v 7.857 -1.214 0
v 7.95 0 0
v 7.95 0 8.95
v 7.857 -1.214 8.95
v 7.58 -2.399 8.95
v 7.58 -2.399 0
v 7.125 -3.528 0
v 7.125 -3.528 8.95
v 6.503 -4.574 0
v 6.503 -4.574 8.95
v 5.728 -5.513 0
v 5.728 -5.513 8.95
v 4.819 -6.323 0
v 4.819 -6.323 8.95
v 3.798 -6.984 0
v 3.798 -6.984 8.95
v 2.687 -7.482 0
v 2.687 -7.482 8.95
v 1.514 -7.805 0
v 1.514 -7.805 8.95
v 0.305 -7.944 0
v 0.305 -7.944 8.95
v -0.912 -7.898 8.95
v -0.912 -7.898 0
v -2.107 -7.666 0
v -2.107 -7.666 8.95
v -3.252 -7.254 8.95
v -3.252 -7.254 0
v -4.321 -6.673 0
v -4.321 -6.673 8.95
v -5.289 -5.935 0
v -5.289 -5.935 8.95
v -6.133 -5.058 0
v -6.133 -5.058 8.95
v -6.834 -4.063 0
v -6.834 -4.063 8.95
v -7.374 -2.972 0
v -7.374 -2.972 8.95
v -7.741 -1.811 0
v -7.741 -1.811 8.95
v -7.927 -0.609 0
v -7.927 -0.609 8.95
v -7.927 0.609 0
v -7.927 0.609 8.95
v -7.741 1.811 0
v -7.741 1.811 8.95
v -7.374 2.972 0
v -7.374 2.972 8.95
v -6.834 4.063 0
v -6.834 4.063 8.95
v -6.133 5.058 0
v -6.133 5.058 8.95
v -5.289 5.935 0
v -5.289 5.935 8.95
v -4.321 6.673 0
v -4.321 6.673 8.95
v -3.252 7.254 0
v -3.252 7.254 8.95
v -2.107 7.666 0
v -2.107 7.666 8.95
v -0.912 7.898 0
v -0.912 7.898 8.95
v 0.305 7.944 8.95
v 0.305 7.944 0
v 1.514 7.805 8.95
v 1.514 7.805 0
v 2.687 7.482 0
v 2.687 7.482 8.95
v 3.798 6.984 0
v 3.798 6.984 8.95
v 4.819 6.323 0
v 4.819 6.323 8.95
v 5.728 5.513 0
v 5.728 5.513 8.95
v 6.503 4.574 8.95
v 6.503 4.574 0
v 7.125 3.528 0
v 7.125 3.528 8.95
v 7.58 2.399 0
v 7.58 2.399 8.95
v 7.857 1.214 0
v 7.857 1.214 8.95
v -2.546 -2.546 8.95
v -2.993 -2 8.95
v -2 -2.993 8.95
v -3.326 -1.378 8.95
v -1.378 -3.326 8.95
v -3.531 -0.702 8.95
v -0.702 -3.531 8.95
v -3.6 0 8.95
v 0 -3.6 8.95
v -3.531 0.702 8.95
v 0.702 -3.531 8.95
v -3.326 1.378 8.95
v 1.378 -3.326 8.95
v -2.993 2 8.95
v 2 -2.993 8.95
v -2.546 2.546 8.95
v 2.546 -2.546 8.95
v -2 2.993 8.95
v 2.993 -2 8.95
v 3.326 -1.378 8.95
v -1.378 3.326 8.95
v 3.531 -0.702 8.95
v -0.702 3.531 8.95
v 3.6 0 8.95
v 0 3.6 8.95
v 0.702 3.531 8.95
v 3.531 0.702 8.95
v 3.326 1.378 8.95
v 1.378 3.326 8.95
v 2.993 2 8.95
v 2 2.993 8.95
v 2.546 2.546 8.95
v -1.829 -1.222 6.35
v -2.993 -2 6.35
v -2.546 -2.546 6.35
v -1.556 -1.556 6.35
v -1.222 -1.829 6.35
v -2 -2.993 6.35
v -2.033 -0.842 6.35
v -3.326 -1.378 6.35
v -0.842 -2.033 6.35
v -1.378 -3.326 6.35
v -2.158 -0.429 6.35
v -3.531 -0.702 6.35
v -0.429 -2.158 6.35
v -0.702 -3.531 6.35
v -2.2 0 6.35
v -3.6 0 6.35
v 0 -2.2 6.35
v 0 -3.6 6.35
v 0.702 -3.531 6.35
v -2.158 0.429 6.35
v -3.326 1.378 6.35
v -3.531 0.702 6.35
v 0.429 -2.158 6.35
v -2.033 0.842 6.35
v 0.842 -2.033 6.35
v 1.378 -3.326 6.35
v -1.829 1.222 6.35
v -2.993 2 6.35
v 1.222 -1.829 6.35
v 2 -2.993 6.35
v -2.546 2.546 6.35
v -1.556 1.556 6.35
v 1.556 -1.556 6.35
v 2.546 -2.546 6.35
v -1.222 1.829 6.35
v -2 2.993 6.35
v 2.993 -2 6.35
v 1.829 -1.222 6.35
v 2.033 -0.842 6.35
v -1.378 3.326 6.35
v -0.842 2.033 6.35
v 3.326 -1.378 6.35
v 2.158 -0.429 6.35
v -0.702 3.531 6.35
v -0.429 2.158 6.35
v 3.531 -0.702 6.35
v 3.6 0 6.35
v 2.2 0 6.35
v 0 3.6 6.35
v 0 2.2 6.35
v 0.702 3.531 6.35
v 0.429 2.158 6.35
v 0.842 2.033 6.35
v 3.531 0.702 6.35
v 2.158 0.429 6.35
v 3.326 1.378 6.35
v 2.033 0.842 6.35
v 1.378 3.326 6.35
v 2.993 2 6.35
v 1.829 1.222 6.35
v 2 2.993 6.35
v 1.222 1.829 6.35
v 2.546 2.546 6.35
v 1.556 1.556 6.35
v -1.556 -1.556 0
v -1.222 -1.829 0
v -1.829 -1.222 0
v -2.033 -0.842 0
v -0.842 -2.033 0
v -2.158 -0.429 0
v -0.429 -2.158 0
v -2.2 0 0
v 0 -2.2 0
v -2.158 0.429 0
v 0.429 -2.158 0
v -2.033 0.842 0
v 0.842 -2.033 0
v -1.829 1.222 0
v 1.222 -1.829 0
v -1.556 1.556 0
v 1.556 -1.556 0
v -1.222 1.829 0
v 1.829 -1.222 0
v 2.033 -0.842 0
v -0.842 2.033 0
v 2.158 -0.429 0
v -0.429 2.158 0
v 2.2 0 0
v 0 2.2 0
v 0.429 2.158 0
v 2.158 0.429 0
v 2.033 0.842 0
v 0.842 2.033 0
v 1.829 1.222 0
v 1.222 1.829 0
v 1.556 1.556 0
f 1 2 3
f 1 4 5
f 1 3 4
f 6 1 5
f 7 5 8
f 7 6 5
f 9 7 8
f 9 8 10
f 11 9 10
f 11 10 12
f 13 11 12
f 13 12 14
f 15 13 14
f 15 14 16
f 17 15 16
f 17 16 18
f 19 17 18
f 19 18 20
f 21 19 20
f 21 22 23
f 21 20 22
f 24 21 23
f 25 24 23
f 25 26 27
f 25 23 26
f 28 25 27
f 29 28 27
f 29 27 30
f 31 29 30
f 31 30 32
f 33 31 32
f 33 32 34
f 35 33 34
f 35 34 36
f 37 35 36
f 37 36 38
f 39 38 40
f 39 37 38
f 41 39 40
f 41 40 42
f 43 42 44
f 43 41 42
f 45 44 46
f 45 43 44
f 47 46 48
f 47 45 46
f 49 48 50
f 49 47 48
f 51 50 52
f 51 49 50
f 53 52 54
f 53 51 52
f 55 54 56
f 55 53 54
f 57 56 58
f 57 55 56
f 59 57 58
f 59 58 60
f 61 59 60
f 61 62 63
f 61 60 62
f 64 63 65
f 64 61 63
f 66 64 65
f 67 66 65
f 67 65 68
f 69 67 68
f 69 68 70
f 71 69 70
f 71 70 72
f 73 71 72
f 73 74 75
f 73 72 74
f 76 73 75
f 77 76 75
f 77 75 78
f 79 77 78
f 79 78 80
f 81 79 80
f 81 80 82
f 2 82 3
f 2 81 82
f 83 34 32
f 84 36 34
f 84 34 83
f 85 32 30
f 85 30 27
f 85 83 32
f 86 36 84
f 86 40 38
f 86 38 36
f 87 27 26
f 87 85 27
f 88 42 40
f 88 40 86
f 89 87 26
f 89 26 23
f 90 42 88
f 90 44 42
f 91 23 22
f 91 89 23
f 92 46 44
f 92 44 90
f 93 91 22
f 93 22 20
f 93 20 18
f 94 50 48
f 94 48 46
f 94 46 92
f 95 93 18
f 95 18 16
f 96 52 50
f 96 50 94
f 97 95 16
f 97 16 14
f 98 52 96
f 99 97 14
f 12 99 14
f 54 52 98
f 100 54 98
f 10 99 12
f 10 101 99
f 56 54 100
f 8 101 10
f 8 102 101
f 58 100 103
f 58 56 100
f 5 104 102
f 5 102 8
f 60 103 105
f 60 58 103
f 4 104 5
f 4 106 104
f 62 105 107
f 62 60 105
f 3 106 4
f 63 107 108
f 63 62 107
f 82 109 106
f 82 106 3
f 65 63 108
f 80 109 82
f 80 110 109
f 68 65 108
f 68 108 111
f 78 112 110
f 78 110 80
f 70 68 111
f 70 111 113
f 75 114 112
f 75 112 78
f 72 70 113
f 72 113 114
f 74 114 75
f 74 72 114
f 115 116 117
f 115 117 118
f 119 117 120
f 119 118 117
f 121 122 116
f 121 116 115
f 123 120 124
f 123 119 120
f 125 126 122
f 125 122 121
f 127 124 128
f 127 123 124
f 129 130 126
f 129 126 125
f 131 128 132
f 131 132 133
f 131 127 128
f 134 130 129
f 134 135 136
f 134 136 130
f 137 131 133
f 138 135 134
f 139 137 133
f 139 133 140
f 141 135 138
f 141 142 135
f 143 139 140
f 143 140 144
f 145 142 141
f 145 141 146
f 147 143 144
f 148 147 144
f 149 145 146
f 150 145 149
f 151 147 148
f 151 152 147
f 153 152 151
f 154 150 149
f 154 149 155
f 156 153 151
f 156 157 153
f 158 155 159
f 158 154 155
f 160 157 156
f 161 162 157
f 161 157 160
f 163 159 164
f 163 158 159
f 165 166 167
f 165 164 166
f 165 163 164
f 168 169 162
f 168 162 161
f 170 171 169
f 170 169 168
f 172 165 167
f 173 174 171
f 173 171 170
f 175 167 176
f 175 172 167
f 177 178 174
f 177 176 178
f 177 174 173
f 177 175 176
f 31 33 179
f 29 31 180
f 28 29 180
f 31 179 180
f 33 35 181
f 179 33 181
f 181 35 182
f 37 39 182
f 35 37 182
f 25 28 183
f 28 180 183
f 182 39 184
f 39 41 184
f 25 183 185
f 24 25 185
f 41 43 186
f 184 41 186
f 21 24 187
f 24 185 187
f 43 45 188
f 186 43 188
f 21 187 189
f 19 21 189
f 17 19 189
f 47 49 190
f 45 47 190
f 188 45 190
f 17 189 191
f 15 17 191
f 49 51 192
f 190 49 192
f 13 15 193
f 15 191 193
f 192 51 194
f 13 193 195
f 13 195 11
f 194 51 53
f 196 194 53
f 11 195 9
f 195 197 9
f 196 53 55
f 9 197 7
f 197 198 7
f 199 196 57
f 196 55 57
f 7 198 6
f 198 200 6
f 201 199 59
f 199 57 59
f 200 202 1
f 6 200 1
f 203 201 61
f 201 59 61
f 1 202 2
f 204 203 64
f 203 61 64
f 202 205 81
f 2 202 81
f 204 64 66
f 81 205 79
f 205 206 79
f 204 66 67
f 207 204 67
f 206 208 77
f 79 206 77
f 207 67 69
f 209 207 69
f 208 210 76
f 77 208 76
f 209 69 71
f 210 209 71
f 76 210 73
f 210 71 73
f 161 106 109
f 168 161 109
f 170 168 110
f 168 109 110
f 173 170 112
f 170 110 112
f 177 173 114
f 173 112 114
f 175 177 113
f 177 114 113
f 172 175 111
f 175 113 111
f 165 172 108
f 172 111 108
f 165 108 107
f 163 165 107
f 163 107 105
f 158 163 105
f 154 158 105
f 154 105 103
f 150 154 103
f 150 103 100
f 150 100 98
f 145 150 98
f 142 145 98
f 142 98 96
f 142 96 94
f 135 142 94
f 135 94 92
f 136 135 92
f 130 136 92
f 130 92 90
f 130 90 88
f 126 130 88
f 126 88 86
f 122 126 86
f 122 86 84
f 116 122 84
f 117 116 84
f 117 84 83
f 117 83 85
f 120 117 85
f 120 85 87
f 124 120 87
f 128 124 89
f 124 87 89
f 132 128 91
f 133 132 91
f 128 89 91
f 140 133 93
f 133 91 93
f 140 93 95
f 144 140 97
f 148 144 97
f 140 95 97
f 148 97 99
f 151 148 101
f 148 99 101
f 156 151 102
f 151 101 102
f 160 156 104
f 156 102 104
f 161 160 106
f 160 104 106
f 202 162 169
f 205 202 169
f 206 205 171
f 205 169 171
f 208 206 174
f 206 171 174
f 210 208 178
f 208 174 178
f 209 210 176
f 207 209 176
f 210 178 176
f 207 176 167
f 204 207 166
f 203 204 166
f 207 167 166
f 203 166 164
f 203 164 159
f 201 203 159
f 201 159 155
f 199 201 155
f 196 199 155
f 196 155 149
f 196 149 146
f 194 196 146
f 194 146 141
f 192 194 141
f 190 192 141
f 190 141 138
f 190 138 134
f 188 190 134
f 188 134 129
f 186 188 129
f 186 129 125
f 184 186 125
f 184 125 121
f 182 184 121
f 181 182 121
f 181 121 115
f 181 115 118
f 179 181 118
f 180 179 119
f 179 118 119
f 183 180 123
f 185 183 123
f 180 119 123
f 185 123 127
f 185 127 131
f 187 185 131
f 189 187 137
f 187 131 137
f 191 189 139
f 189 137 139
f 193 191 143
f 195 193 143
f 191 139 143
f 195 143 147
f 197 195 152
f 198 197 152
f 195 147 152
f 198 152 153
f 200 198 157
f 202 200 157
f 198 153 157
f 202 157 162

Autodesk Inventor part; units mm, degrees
ref_plane "YZ Plane" through (0, 0, 0) normal (1, 0, 0) x (0, 1, 0)
ref_plane "XZ Plane" through (0, 0, 0) normal (0, 1, 0) x (-1, 0, 0)
ref_plane "XY Plane" through (0, 0, 0) normal (0, 0, 1) x (1, 0, 0)
sketch "Sketch1" plane through (0, 0, 0) normal (0, 0, 1) x (1, 0, 0)
  circle A0 centre (0, 0) radius 7.95
  dimension "d0" = 15.9
extrude "Extrusion1" add sketch "Sketch1" along normal blind 8.95
sketch "Sketch2" plane through (0, 0, 8.95) normal (0, 0, 1) x (1, 0, 0)
  circle A0 centre (0, 0) radius 3.6
  dimension "d3" = 7.2
extrude "Extrusion2" cut sketch "Sketch2" against normal blind 2.6
sketch "Sketch3" plane through (0, 0, 6.35) normal (0, 0, 1) x (1, 0, 0)
  circle A0 centre (0, 0) radius 2.2
  dimension "d6" = 4.4
extrude "Extrusion3" cut sketch "Sketch3" against normal up to next
properties part number "E3Dv6Spacer"
